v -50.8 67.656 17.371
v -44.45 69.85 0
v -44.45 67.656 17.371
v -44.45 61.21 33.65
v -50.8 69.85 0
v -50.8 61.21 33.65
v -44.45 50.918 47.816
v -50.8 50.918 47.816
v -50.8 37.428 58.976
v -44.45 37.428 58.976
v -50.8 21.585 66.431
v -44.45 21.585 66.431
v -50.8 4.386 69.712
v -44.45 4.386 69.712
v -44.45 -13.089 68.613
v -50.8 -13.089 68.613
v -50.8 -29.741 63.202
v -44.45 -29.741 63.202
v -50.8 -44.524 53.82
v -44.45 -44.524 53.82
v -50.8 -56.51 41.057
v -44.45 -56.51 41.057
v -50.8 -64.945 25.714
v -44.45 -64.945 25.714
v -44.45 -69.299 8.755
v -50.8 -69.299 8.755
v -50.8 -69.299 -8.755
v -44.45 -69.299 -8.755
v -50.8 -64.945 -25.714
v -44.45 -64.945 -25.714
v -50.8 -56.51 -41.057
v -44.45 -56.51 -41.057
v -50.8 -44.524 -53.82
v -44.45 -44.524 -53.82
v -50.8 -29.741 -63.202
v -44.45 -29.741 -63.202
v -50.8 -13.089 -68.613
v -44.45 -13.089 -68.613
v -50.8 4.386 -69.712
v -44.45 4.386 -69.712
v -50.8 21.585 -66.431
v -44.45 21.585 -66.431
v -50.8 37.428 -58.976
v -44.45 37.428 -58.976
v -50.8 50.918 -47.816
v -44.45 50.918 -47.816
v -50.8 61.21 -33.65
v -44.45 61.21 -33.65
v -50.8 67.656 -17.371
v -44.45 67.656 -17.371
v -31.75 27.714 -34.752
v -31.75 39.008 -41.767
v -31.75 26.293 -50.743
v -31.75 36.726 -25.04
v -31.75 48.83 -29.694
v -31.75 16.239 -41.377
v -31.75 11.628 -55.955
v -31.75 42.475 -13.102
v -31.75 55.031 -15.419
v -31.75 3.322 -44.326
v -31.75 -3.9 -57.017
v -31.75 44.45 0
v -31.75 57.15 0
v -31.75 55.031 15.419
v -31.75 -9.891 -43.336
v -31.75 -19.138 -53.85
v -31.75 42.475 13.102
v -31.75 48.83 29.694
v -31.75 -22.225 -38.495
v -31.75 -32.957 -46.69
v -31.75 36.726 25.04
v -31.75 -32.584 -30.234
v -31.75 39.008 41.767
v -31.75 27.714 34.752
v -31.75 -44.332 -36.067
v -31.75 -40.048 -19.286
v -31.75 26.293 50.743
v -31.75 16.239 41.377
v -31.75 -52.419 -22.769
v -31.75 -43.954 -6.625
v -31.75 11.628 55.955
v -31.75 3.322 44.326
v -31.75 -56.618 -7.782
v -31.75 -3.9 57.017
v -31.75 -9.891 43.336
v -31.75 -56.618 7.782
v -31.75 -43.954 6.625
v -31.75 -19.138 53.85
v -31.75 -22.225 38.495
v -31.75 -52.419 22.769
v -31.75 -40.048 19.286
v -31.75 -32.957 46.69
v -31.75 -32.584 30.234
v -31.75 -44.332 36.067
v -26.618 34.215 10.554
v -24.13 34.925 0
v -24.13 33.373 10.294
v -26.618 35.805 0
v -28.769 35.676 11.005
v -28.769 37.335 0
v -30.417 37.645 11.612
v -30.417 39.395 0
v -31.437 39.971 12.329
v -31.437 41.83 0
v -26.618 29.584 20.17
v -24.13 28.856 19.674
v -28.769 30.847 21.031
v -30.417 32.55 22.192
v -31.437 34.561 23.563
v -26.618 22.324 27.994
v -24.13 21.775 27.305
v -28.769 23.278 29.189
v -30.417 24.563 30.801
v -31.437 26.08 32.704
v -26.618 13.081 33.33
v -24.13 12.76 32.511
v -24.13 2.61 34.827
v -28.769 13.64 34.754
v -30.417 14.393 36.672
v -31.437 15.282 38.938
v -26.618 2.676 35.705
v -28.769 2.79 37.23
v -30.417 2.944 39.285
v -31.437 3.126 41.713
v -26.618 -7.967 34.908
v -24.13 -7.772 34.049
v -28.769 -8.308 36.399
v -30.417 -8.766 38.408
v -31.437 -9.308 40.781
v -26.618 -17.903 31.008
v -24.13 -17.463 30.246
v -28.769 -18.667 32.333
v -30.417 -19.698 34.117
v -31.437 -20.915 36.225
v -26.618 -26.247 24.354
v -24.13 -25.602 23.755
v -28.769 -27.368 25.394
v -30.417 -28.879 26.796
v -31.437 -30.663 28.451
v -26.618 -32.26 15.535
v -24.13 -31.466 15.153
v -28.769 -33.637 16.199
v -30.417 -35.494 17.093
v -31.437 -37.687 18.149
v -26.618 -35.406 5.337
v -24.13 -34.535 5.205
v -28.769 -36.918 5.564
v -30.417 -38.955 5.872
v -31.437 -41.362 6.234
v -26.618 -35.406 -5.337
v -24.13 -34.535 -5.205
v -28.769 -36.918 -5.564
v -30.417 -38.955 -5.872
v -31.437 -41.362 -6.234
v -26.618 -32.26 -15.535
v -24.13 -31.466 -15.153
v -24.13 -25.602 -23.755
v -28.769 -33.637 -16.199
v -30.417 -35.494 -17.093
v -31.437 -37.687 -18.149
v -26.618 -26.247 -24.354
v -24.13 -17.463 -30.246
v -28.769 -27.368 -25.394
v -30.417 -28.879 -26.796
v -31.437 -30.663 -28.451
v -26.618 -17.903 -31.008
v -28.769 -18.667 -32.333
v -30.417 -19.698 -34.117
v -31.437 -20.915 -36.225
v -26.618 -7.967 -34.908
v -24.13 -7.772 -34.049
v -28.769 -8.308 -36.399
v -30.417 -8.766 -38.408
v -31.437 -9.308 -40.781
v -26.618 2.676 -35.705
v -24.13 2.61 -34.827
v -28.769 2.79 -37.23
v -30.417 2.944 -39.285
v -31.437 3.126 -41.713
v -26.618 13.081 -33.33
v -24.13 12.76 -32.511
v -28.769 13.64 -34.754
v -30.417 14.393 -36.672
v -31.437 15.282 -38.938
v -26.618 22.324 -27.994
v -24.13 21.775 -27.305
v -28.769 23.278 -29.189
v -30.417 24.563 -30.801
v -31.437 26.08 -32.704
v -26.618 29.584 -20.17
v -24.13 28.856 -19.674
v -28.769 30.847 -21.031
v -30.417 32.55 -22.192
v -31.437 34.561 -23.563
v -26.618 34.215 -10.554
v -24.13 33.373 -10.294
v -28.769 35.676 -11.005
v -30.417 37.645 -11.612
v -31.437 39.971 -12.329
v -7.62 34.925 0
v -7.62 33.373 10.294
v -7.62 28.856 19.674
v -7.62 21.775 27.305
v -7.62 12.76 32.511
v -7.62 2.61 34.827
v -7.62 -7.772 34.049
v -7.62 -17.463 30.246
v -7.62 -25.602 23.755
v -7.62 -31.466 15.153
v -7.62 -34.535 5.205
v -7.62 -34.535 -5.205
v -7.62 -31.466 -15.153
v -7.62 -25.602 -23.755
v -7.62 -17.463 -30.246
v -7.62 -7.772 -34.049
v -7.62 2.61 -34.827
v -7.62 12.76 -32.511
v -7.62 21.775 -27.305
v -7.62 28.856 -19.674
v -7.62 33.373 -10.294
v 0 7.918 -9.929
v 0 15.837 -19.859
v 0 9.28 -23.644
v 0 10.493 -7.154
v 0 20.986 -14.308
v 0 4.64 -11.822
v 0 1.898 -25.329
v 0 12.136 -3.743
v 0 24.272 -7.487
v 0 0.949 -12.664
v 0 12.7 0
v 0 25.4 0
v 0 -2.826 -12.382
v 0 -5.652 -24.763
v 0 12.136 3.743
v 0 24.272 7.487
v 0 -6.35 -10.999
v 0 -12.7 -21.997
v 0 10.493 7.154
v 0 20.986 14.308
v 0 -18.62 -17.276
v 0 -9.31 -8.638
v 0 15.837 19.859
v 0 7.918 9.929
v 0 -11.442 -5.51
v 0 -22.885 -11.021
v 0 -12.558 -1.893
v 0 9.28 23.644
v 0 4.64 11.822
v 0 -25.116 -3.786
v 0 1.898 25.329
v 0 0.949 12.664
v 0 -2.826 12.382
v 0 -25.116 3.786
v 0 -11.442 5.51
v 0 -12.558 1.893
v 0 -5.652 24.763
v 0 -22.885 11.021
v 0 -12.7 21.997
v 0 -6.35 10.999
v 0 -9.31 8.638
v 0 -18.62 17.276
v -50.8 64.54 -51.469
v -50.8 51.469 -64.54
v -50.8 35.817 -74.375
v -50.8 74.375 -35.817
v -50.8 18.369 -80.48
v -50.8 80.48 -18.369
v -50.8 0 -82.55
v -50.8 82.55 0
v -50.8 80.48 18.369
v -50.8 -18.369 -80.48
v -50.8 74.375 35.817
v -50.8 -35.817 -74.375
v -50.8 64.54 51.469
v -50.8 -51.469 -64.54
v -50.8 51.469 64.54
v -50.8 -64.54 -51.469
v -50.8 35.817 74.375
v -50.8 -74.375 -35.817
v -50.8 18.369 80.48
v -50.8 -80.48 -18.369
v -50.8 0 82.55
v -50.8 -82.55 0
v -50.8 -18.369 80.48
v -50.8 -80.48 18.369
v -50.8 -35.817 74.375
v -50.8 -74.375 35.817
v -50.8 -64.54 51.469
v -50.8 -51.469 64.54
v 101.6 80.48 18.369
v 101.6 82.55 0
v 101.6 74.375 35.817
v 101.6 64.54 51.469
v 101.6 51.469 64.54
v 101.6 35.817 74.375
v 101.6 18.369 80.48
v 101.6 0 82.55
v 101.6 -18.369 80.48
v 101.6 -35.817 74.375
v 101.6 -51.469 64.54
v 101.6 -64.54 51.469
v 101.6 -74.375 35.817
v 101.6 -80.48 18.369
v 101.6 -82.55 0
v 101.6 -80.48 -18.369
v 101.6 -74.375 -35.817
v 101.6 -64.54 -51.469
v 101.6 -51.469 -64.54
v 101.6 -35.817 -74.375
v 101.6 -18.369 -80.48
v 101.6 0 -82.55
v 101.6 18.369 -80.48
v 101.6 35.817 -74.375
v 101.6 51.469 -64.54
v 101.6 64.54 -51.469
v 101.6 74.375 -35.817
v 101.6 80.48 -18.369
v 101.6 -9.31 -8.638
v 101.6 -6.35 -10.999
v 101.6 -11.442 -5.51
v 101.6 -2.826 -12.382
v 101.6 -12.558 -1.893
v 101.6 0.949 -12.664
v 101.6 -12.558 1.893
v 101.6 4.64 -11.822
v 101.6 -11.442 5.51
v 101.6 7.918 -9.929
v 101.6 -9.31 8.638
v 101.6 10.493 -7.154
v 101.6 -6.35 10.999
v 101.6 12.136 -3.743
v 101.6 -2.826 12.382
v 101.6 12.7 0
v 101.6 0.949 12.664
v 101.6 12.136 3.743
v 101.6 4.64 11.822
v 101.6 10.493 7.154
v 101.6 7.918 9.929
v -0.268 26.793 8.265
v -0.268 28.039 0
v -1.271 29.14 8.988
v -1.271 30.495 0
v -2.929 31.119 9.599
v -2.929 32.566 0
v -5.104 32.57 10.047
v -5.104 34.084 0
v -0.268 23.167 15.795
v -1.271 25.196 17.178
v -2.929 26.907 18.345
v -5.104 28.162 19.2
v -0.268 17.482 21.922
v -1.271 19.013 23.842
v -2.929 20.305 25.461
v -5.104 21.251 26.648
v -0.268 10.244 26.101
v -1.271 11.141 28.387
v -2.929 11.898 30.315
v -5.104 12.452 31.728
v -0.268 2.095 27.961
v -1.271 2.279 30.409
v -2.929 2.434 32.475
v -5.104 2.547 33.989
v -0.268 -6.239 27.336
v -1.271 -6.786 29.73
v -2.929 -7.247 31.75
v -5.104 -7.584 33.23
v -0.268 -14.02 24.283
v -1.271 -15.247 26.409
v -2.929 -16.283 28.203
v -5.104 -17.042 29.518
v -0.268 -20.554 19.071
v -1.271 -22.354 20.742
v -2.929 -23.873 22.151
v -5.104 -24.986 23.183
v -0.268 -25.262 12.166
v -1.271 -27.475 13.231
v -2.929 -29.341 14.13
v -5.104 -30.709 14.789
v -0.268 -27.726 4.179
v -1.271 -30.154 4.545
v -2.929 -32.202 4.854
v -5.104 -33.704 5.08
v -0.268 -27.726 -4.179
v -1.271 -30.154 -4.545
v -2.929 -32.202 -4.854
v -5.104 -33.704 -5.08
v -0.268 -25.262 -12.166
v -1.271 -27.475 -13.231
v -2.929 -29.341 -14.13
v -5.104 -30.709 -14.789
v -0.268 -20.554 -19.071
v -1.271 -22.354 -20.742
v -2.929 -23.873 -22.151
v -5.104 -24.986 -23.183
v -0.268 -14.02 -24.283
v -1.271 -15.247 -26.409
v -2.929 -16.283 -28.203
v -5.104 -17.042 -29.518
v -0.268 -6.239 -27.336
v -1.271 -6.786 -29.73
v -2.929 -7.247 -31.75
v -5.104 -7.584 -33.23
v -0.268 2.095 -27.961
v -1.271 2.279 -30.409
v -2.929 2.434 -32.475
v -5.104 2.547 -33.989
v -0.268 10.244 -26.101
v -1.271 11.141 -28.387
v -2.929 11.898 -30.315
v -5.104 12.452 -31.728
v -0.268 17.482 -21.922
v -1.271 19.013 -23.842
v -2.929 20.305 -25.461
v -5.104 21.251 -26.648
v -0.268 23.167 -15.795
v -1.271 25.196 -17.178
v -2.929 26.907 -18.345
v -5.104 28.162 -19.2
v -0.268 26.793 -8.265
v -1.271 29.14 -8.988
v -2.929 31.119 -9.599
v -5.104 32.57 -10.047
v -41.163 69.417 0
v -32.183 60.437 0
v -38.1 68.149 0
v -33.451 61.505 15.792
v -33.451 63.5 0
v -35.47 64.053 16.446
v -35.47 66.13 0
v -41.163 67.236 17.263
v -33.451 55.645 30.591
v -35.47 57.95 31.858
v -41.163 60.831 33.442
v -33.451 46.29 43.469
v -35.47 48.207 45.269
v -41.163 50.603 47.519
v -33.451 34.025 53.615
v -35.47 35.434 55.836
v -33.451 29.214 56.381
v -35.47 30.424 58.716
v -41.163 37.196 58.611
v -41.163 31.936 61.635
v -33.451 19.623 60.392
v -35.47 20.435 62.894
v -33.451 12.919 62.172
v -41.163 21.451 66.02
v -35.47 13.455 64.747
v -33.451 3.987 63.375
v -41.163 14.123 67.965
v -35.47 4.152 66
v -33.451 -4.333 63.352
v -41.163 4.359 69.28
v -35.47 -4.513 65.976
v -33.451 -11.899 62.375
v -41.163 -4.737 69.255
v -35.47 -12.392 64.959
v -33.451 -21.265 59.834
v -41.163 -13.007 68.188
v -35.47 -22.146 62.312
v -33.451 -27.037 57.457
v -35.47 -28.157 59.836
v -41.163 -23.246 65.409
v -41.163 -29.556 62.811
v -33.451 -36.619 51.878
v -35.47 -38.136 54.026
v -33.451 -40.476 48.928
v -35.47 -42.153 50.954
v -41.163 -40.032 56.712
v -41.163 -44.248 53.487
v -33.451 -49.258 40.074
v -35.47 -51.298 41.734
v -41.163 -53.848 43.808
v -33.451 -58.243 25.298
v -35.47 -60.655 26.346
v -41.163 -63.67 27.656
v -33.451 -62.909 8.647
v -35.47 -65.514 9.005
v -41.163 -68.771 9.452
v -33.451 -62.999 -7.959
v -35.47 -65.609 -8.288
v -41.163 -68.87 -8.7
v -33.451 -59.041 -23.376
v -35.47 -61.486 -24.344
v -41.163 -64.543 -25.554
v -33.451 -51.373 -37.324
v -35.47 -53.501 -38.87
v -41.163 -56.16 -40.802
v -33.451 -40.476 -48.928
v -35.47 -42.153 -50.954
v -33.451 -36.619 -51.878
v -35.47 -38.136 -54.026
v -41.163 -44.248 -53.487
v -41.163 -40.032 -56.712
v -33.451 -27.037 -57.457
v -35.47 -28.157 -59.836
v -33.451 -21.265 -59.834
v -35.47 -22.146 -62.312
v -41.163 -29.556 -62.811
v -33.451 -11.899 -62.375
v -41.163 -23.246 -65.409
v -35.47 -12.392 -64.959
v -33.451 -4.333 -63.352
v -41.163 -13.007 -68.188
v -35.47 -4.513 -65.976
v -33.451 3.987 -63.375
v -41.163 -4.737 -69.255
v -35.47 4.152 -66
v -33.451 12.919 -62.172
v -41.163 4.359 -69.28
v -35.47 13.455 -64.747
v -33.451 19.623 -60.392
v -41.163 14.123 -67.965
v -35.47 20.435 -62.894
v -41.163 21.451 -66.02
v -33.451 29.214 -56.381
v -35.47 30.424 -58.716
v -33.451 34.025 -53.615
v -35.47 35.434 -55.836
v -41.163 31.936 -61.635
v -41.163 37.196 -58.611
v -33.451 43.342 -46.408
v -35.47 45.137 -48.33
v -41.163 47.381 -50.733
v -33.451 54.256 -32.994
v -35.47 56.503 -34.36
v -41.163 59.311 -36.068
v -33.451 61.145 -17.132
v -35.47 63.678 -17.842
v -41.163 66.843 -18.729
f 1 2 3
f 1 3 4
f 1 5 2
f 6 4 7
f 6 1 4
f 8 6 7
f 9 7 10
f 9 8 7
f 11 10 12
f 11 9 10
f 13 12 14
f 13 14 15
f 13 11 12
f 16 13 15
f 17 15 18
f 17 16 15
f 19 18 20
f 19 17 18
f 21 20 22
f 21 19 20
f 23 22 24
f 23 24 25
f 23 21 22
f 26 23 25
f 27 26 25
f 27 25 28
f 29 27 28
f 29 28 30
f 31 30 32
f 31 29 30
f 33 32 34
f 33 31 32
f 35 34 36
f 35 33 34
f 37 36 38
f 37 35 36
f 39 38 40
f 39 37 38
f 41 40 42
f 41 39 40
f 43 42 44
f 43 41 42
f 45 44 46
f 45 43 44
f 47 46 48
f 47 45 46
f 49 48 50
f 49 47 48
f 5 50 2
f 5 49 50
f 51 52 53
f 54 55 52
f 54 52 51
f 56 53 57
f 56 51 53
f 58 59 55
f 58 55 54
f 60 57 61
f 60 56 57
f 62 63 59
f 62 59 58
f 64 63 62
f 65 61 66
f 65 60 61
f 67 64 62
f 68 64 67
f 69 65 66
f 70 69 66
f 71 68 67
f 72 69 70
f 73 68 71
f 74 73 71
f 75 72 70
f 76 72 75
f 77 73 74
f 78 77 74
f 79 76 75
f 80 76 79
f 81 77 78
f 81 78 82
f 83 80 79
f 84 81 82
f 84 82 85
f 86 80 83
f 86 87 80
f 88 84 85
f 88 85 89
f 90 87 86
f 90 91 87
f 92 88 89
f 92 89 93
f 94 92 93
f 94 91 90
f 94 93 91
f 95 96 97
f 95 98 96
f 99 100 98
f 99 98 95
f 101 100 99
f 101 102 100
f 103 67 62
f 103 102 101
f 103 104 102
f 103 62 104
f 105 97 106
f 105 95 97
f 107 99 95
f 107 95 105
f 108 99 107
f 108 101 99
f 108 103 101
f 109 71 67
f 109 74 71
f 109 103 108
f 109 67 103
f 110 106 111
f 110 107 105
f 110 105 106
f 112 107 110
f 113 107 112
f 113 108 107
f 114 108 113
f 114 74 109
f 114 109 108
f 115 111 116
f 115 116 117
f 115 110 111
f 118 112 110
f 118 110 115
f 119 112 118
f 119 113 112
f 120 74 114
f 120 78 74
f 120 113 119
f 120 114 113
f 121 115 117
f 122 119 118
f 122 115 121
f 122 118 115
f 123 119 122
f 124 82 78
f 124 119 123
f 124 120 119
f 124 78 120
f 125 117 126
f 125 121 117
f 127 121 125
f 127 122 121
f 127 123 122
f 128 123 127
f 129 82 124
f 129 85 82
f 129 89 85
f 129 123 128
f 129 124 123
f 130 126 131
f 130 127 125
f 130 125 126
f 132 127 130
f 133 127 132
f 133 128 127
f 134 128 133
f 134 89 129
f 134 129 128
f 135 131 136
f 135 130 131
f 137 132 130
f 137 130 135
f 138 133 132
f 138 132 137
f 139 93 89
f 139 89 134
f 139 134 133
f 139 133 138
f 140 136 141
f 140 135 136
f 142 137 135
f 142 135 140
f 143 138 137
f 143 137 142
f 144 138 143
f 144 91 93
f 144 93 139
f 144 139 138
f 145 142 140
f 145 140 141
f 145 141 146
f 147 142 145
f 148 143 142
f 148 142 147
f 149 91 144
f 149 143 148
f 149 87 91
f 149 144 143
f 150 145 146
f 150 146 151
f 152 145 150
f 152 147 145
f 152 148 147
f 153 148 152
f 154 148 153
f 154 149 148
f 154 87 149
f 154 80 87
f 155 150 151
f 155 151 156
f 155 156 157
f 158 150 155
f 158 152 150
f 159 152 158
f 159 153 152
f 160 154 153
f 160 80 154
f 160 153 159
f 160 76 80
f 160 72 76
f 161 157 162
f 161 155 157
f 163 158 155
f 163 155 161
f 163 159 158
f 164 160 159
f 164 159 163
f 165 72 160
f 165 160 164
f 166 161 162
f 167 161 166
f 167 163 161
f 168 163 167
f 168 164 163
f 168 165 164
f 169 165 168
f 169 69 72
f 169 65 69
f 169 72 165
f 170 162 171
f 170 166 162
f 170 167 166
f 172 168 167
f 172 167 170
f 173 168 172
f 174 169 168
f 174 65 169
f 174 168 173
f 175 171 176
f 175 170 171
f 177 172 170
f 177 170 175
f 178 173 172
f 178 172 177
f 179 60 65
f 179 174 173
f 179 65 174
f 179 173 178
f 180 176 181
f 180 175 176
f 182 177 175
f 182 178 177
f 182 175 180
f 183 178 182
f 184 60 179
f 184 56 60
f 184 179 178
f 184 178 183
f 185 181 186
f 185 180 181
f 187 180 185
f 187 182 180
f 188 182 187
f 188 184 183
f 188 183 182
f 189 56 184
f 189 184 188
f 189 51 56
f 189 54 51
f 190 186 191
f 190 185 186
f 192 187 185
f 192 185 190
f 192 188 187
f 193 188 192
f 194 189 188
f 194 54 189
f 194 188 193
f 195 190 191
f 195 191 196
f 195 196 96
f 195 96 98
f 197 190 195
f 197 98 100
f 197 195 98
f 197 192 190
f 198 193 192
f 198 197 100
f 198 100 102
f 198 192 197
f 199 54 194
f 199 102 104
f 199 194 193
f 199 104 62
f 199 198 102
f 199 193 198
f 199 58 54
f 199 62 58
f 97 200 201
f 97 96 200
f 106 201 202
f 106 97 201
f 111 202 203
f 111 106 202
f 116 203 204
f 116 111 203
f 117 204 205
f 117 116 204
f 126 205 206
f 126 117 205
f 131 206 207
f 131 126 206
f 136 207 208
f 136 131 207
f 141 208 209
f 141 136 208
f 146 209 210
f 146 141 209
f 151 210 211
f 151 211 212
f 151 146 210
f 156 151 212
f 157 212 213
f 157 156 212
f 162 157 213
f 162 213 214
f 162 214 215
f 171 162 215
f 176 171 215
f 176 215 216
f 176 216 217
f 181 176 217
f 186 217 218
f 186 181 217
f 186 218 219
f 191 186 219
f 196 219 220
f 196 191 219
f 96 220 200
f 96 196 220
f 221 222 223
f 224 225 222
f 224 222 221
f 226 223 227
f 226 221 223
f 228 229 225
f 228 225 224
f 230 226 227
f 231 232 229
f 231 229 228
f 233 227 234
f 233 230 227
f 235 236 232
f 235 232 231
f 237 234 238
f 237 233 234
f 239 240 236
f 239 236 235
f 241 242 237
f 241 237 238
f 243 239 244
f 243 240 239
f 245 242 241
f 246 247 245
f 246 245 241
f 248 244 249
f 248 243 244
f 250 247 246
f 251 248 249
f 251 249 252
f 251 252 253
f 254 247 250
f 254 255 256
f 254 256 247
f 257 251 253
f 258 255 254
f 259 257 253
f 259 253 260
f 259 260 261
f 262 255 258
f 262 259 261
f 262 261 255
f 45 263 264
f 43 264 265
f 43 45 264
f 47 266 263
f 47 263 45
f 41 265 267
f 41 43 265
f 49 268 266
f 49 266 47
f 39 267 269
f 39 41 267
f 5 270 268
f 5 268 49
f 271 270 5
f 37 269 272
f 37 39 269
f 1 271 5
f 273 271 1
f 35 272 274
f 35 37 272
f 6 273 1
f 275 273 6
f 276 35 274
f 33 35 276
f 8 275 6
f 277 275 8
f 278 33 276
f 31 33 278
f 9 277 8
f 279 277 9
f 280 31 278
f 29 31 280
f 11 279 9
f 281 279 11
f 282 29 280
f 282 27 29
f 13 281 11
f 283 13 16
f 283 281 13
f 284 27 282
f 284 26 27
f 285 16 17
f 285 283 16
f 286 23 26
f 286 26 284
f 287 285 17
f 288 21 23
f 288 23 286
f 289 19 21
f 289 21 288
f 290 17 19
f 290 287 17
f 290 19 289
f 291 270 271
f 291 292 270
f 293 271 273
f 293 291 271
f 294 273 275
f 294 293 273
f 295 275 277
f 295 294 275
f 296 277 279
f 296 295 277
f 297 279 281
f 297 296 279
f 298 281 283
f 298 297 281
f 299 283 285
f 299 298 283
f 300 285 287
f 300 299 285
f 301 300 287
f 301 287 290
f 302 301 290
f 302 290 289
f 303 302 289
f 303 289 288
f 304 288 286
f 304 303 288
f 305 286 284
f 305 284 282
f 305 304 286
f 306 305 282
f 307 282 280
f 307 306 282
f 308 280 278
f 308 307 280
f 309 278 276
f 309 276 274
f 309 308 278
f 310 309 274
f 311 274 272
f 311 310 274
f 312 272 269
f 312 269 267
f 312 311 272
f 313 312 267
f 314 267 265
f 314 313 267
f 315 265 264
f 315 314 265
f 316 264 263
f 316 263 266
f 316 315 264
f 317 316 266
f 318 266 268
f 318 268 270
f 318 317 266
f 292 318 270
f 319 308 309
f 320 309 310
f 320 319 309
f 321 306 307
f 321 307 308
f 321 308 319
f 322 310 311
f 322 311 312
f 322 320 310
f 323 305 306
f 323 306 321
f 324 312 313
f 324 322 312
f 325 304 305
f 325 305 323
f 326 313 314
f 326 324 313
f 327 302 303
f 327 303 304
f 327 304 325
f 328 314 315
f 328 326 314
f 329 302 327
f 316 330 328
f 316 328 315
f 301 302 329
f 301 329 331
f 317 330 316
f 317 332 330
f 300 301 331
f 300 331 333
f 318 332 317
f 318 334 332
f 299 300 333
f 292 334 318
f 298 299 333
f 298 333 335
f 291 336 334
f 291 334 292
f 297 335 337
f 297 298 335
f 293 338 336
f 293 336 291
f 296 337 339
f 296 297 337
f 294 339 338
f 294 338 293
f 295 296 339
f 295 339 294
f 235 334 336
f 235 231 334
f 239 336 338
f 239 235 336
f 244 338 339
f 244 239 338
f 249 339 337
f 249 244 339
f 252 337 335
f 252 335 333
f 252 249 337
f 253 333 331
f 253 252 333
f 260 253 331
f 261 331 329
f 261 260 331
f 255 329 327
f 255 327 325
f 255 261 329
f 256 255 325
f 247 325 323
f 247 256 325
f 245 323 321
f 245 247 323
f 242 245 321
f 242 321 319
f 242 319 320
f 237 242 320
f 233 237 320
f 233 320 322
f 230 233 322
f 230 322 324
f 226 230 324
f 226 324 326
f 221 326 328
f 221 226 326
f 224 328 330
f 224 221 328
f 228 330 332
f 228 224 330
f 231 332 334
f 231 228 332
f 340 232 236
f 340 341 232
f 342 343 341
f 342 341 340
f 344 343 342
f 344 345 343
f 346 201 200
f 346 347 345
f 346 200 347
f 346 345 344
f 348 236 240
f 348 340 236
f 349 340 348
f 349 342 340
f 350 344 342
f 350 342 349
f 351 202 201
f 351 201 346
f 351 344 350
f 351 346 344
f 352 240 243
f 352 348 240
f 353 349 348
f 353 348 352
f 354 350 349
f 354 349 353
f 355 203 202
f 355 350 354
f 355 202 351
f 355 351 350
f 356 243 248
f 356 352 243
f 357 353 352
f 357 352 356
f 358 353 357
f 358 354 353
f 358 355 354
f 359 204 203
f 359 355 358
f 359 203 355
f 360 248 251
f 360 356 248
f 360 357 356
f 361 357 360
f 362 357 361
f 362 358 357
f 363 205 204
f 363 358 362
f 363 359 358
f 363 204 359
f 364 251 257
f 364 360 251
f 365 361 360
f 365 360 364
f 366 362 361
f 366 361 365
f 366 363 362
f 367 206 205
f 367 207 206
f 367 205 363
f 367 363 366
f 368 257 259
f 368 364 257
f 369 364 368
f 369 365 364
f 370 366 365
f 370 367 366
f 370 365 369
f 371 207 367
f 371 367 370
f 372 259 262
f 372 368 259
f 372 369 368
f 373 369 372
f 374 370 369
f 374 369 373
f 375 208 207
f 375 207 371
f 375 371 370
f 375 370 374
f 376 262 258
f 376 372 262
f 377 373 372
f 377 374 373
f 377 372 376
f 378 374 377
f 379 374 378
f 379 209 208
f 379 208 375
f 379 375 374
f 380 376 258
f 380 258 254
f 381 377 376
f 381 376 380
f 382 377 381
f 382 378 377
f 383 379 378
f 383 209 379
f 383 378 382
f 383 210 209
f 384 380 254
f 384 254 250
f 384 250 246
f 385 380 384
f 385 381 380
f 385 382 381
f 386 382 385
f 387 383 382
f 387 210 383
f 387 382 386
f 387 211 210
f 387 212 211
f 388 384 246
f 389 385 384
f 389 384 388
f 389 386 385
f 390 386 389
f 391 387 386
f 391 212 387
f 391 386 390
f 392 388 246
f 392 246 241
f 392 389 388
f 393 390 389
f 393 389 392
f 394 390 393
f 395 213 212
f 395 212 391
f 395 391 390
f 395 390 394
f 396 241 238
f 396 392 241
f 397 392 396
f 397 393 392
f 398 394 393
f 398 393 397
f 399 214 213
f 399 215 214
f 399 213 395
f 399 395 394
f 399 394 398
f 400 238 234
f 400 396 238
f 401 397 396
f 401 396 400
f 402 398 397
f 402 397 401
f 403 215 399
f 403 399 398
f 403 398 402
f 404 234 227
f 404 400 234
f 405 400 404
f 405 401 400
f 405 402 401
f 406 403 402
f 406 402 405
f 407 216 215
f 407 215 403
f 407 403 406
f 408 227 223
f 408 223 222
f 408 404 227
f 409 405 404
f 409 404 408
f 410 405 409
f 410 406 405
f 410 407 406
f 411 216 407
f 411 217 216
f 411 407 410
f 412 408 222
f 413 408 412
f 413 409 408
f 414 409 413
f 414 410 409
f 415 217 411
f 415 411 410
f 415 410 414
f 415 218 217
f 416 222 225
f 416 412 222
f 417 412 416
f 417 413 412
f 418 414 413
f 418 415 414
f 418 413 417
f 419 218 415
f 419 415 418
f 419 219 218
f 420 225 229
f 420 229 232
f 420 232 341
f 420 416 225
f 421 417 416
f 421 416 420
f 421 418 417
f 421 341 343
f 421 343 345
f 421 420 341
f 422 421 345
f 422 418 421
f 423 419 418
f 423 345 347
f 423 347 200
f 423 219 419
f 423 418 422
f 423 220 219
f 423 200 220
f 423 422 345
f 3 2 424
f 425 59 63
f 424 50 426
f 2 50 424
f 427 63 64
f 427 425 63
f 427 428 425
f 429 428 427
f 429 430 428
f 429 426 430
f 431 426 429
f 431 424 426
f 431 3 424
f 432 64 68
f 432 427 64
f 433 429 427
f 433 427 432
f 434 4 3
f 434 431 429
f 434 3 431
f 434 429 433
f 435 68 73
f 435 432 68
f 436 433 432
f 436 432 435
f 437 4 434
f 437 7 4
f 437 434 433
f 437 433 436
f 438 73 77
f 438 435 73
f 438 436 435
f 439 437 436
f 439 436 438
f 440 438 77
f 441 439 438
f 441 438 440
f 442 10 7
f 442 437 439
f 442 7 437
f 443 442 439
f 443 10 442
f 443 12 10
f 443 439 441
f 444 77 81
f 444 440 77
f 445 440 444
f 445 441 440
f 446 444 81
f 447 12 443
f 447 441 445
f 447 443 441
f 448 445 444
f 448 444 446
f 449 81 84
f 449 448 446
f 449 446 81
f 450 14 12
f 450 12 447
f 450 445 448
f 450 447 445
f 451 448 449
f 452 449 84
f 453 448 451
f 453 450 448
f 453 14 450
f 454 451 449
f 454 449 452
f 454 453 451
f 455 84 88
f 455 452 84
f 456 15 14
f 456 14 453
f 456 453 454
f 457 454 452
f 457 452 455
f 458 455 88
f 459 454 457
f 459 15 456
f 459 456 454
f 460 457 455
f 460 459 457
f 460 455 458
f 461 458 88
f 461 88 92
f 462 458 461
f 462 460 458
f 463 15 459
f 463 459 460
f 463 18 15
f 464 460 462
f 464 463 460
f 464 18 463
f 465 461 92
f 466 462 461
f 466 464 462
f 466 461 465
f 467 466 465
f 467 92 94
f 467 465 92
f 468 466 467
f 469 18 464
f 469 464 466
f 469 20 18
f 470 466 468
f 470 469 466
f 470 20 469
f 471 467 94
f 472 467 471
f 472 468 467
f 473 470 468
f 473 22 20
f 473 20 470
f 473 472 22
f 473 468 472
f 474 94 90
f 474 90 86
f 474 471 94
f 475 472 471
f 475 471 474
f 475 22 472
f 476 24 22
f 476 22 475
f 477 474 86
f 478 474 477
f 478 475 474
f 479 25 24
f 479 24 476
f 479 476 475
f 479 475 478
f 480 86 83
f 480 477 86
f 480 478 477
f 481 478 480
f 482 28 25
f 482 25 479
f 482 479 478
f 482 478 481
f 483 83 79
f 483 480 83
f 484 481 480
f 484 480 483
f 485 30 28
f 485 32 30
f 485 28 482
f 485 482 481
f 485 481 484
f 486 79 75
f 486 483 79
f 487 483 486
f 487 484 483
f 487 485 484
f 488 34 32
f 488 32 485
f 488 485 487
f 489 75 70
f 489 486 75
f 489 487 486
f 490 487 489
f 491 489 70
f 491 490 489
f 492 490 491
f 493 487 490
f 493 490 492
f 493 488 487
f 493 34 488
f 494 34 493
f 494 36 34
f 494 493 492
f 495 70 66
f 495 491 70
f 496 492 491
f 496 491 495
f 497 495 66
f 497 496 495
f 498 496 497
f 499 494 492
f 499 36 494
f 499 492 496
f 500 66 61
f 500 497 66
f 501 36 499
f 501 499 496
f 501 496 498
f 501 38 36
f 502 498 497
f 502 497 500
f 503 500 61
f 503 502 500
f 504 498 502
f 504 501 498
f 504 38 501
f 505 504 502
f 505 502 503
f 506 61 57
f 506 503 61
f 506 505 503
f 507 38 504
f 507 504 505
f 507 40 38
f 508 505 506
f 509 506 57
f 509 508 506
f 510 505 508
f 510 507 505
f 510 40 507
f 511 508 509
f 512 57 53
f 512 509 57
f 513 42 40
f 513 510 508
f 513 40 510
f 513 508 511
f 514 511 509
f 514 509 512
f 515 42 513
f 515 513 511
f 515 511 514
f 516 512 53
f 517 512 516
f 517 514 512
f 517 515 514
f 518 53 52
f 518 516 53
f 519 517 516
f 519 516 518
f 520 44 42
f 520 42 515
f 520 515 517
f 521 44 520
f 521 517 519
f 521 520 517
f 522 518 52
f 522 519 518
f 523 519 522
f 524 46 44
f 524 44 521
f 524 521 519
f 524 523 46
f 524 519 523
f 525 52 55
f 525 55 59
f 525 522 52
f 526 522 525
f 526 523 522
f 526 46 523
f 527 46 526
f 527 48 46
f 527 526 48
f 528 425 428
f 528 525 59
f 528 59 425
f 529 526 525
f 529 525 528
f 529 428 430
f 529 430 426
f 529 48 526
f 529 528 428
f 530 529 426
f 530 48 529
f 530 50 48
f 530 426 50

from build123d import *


with BuildPart() as part:
    # Sketch1 → Revolve2 (revolve)
    with BuildSketch(Plane.XY):
        with BuildLine():
            Line((-50.8, 69.85), (-50.8, 82.55))
            Line((-50.8, 82.55), (101.6, 82.55))
            Line((101.6, 82.55), (101.6, 12.7))
            Line((101.6, 12.7), (0, 12.7))
            Line((0, 12.7), (0, 25.4))
            ThreePointArc((0, 25.4), (-2.025659238, 31.58997261), (-7.62, 34.925))
            Line((-7.62, 34.925), (-24.13, 34.925))
            ThreePointArc((-24.13, 34.925), (-29.664711714, 38.307730629), (-31.75, 44.45))
            Line((-31.75, 44.45), (-31.75, 57.15))
            ThreePointArc((-31.75, 57.15), (-35.469743879, 66.130256121), (-44.45, 69.85))
            Line((-44.45, 69.85), (-50.8, 69.85))
        make_face()
    revolve(axis=Axis((0, 0, 0), (1, 0, 0)))


solid = part.part
